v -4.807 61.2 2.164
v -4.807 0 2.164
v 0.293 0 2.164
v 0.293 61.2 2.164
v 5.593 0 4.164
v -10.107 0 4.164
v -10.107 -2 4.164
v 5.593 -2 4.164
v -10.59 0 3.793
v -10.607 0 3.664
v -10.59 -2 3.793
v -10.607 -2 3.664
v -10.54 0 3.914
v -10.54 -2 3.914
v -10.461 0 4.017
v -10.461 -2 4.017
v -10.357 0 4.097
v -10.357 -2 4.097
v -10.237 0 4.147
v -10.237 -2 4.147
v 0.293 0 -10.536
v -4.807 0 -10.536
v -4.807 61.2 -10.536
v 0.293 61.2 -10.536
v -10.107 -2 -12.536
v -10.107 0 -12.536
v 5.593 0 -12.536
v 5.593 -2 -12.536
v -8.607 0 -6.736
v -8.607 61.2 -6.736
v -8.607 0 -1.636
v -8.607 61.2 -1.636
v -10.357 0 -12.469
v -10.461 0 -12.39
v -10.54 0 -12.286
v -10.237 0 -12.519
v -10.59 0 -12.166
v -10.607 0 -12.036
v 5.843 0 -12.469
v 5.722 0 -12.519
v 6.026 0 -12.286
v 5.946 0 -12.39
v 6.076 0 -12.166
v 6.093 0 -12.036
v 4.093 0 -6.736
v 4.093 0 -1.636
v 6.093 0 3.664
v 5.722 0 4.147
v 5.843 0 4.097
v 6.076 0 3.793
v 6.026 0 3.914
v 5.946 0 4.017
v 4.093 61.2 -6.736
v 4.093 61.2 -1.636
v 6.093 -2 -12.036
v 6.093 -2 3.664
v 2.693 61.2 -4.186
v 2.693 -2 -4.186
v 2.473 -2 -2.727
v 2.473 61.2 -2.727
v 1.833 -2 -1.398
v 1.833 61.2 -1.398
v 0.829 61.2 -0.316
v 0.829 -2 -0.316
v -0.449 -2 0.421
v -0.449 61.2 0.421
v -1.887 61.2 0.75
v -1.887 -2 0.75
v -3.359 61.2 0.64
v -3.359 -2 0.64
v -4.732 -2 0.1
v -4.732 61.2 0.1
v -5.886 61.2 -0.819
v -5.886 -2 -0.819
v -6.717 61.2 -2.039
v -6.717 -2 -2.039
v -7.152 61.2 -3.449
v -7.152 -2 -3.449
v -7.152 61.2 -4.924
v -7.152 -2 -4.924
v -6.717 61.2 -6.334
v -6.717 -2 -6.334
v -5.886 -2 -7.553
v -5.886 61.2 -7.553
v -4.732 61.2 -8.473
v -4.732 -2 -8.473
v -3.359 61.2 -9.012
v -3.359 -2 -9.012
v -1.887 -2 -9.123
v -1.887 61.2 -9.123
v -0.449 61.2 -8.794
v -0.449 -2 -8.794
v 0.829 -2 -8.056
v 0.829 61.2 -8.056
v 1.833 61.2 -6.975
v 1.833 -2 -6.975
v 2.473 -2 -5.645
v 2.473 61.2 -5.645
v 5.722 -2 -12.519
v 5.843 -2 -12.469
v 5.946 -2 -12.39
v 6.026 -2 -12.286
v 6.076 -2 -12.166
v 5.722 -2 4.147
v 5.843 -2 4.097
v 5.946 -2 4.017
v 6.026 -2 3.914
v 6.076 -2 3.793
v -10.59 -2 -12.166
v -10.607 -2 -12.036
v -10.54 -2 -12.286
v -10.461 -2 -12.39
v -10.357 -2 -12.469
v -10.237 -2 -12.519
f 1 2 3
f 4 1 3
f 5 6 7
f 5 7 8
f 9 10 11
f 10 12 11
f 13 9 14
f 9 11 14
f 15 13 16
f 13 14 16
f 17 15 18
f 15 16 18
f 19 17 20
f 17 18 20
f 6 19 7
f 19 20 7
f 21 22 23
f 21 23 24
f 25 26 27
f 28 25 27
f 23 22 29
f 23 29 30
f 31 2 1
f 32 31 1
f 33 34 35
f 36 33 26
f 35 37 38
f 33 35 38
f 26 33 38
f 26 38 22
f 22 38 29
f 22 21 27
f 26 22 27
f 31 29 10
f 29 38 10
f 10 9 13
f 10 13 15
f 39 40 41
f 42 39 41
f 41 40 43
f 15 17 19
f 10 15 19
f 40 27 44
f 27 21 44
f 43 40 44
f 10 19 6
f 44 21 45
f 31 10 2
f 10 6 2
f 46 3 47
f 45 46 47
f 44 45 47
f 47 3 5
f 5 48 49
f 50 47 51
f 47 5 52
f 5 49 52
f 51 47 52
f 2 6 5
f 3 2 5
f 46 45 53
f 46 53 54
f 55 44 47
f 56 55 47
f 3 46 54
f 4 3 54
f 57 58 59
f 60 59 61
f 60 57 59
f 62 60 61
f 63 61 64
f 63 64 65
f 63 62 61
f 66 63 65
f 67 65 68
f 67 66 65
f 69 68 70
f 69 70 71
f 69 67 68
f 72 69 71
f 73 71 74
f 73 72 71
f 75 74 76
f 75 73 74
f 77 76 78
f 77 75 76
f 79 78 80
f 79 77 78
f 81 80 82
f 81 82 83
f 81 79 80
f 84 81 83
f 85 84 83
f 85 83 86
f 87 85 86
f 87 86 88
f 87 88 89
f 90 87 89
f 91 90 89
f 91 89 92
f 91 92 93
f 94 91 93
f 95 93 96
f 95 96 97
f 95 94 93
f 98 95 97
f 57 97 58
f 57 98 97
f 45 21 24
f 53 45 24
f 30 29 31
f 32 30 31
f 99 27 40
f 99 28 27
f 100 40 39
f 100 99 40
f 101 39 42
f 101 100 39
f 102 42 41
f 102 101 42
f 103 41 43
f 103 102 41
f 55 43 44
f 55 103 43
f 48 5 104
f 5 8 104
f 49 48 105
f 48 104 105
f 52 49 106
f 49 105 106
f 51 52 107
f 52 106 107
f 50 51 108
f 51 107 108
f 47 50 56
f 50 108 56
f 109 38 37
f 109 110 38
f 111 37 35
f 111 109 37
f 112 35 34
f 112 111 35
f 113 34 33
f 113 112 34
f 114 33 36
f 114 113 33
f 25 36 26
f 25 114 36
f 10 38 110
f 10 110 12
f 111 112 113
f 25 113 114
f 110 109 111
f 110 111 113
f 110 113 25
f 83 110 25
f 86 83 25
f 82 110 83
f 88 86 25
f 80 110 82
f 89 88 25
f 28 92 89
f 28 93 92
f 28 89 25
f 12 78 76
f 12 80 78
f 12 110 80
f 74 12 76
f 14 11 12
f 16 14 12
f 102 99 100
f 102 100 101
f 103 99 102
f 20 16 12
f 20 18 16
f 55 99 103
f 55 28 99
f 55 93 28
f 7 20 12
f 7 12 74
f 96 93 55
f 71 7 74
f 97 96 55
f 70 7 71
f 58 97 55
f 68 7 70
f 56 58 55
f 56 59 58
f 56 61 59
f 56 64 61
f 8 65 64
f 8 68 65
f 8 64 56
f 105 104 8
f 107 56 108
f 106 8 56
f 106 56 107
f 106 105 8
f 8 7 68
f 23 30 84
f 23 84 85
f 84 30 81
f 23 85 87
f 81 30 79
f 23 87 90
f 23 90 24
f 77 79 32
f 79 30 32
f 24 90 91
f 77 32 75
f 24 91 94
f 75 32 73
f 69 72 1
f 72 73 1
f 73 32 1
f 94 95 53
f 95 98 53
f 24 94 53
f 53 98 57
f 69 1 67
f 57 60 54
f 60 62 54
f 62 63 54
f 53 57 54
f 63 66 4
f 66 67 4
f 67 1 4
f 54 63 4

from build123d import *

# Parameters (mm, degrees)
F0_W     = 16.7
F0_H     = 16.7
F0_W_2   = 12.7
F0_H_2   = 12.7
F0_R     = 4.95
F1_DEPTH = 2
F2_DEPTH = 61.2
F3_R     = 0.5
F4_SIZE  = 3.8


with BuildPart() as f1:
    # F0 (on Front) → F1 (new body)
    with BuildSketch(Plane.XZ):
        with Locations((-2.257177, -4.186354)):
            Rectangle(F0_W, F0_H)
        with Locations((-2.257177, -4.186354)):
            Rectangle(F0_W_2, F0_H_2, mode=Mode.SUBTRACT)
        with Locations((-2.257177, -4.186354)):
            Rectangle(F0_W_2, F0_H_2)
        with Locations((-2.257177, -4.186354)):
            Circle(F0_R, mode=Mode.SUBTRACT)
    extrude(amount=F1_DEPTH)

    # F0 (on Front) → F2 (join)
    with BuildSketch(Plane.XZ):
        with Locations((-2.257177, -4.186354)):
            Rectangle(F0_W_2, F0_H_2)
        with Locations((-2.257177, -4.186354)):
            Circle(F0_R, mode=Mode.SUBTRACT)
    extrude(amount=-F2_DEPTH)

    # F3
    f3_edges = [f1.edges().sort_by_distance(p)[0] for p in [
        (-10.607177, -1, 4.163646),
        (6.092823, -1, 4.163646),
        (6.092823, -1, -12.536354),
        (-10.607177, -1, -12.536354),
    ]]
    fillet(f3_edges, radius=F3_R)

    # F4
    f4_edges = [f1.edges().sort_by_distance(p)[0] for p in [
        (-8.607177, 30.6, -10.536354),
        (-8.607177, 30.6, 2.163646),
        (4.092823, 30.6, -10.536354),
        (4.092823, 30.6, 2.163646),
    ]]
    chamfer(f4_edges, length=F4_SIZE)


solid = f1.part
